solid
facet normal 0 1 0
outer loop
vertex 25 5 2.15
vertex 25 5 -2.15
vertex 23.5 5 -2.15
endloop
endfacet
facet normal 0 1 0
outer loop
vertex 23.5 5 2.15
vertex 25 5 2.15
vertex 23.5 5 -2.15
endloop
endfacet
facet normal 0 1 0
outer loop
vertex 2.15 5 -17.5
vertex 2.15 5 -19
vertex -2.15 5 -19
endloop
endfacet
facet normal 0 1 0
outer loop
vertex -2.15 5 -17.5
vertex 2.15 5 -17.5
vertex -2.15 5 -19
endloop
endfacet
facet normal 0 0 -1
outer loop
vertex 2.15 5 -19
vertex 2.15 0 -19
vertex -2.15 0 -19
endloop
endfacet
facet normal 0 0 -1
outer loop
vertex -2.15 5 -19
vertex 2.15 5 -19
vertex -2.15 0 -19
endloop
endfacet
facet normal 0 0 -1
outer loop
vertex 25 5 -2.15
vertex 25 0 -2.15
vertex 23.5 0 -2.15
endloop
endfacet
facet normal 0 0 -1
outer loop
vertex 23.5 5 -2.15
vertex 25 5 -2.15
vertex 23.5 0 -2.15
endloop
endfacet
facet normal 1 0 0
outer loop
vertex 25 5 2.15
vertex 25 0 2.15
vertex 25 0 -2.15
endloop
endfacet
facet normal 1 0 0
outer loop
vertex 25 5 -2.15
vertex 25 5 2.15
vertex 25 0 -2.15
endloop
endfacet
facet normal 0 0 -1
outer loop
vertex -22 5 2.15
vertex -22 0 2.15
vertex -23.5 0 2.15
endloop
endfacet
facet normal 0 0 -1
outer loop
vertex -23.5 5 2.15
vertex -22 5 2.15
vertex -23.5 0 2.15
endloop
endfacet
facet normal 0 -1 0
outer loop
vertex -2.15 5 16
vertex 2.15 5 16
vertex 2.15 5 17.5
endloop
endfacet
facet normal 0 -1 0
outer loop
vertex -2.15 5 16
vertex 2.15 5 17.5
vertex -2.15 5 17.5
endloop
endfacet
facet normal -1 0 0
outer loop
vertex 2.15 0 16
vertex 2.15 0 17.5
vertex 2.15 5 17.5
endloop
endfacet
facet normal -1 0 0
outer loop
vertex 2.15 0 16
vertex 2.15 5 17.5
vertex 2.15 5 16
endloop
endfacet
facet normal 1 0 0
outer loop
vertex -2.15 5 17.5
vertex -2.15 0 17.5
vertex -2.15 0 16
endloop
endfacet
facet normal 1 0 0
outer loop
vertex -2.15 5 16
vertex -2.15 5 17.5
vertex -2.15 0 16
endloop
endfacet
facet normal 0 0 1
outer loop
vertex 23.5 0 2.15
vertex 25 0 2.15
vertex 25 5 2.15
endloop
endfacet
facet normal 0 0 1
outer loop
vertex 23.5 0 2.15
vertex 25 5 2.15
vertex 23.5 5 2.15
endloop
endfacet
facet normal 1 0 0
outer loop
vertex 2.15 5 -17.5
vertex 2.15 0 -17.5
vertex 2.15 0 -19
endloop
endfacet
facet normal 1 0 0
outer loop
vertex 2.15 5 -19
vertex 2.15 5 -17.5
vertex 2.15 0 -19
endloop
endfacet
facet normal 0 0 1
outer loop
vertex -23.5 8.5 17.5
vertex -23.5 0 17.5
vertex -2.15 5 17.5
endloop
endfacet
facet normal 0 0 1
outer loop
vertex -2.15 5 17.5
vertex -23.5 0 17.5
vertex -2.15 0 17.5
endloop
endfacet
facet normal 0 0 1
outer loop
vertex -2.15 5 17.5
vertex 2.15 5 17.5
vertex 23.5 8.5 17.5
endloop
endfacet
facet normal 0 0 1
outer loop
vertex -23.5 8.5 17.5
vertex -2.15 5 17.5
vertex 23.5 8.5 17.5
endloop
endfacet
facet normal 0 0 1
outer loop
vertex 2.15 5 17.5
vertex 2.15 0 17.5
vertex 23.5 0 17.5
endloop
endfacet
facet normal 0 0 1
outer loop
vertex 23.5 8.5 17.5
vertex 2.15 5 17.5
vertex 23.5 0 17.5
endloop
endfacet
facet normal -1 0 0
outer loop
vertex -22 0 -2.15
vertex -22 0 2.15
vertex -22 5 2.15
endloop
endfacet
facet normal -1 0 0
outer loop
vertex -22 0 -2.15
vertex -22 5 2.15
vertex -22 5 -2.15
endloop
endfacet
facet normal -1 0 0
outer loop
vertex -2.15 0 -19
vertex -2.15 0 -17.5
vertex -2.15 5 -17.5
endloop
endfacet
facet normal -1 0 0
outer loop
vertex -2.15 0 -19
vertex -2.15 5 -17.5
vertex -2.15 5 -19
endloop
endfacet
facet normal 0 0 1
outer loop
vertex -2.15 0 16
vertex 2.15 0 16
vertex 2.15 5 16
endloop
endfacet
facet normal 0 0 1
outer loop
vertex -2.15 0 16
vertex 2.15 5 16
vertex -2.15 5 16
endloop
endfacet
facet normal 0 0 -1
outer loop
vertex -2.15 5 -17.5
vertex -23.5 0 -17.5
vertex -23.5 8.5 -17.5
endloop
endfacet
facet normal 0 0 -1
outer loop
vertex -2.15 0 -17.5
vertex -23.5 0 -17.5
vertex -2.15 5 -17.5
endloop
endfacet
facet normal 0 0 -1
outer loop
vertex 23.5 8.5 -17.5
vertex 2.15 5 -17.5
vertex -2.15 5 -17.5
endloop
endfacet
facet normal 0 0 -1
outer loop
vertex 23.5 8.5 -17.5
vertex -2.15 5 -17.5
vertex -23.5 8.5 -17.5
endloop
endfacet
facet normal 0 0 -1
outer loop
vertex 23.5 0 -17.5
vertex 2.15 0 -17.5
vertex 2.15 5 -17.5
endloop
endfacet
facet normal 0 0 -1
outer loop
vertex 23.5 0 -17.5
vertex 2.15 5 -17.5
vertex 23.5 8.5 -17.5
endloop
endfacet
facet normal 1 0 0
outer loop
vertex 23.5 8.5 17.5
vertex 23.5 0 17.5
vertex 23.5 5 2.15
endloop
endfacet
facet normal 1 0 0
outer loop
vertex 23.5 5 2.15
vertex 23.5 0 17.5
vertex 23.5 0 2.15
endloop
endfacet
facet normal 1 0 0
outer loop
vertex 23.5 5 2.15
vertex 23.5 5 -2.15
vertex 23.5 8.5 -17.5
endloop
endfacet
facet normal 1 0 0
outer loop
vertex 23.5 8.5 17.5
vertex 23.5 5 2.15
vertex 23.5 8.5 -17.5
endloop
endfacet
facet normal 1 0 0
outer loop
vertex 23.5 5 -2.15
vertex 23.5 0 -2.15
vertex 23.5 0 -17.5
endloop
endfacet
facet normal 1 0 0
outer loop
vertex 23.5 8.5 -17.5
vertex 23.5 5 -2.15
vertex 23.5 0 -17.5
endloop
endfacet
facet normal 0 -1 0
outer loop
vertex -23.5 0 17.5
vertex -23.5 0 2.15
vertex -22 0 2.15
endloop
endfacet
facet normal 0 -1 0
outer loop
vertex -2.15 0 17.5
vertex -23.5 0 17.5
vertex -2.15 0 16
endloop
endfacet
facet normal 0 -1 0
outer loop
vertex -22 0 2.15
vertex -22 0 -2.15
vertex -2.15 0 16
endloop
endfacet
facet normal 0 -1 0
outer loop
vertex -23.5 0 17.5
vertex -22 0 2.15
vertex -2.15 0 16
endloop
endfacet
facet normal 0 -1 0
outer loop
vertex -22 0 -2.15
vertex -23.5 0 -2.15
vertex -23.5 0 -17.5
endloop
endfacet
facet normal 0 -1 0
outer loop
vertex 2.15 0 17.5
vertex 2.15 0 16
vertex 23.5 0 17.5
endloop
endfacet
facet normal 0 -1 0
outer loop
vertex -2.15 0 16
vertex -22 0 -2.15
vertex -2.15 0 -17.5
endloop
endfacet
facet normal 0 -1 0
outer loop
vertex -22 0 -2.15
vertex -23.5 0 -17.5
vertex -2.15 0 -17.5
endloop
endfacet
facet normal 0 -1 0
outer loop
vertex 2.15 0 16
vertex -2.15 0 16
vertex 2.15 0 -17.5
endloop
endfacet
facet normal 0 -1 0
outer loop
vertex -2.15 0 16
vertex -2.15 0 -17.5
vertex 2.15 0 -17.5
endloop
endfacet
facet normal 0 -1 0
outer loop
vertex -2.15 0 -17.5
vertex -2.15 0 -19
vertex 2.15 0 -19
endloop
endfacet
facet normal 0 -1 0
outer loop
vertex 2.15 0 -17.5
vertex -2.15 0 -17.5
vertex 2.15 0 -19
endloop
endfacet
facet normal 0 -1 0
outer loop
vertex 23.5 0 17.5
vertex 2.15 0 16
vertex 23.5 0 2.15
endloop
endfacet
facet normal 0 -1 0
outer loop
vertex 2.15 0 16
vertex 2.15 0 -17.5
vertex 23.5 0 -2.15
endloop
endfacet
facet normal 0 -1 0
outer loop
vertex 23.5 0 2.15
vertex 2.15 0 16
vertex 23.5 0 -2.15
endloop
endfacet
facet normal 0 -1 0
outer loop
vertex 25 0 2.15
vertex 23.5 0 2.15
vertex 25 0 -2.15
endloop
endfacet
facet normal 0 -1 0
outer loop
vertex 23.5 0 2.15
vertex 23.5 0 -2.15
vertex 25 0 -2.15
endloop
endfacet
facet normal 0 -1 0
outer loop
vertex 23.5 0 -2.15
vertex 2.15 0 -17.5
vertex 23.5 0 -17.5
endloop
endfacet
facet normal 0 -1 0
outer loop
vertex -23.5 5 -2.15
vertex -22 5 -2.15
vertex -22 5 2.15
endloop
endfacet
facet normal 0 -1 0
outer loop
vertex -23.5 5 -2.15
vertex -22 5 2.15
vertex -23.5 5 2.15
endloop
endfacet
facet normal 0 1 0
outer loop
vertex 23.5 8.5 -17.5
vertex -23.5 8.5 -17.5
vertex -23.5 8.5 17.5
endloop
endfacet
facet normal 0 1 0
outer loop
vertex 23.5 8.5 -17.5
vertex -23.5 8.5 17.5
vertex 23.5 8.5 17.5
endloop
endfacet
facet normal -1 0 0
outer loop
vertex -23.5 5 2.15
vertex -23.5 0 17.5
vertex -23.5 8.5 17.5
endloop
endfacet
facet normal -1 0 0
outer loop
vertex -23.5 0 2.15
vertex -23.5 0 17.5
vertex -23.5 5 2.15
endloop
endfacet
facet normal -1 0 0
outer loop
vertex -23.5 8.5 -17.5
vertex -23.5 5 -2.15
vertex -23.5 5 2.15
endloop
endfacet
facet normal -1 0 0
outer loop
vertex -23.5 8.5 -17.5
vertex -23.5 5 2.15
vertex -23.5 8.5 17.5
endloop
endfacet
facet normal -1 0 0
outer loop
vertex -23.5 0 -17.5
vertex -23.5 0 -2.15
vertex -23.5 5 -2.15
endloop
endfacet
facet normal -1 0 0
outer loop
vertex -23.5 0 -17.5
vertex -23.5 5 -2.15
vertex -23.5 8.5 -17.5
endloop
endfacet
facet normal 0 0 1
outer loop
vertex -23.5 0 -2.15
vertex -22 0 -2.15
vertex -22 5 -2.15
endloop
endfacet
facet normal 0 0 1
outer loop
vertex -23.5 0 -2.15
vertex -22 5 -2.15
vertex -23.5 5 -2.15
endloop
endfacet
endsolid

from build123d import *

# Parameters (mm, degrees)
SKETCH1_W           = 47
SKETCH1_H           = 35
BOSS_EXTRUDE1_DEPTH = 8.5
SKETCH2_W           = 4.3
SKETCH2_H           = 1.5
SKETCH2_W_2         = 1.5
SKETCH2_H_2         = 4.3
BOSS_EXTRUDE2_DEPTH = 5
SKETCH3_W           = 4.3
SKETCH3_H           = 1.5
SKETCH3_W_2         = 1.5
SKETCH3_H_2         = 4.3
CUT_EXTRUDE1_DEPTH  = 5


with BuildPart() as part:
    # Sketch1 → Boss-Extrude1 (new body)
    with BuildSketch(Plane(origin=(0, 0, 0), x_dir=(1, 0, 0), z_dir=(0, 1, 0))):
        Rectangle(SKETCH1_W, SKETCH1_H)
    extrude(amount=BOSS_EXTRUDE1_DEPTH)

    # Sketch2 → Boss-Extrude2 (add)
    with BuildSketch(Plane(origin=(0, 0, 0), x_dir=(-1, 0, 0), z_dir=(0, -1, 0))):
        with Locations((0, 18.25)):
            Rectangle(SKETCH2_W, SKETCH2_H)
        with Locations((-24.25, 0)):
            Rectangle(SKETCH2_W_2, SKETCH2_H_2)
    extrude(amount=-BOSS_EXTRUDE2_DEPTH)

    # Sketch3 → Cut-Extrude1 (cut)
    with BuildSketch(Plane(origin=(0, 0, 0), x_dir=(-1, 0, 0), z_dir=(0, -1, 0))):
        with Locations((0, -16.75)):
            Rectangle(SKETCH3_W, SKETCH3_H)
        with Locations((22.75, 0)):
            Rectangle(SKETCH3_W_2, SKETCH3_H_2)
    extrude(amount=-CUT_EXTRUDE1_DEPTH, mode=Mode.SUBTRACT)


solid = part.part
